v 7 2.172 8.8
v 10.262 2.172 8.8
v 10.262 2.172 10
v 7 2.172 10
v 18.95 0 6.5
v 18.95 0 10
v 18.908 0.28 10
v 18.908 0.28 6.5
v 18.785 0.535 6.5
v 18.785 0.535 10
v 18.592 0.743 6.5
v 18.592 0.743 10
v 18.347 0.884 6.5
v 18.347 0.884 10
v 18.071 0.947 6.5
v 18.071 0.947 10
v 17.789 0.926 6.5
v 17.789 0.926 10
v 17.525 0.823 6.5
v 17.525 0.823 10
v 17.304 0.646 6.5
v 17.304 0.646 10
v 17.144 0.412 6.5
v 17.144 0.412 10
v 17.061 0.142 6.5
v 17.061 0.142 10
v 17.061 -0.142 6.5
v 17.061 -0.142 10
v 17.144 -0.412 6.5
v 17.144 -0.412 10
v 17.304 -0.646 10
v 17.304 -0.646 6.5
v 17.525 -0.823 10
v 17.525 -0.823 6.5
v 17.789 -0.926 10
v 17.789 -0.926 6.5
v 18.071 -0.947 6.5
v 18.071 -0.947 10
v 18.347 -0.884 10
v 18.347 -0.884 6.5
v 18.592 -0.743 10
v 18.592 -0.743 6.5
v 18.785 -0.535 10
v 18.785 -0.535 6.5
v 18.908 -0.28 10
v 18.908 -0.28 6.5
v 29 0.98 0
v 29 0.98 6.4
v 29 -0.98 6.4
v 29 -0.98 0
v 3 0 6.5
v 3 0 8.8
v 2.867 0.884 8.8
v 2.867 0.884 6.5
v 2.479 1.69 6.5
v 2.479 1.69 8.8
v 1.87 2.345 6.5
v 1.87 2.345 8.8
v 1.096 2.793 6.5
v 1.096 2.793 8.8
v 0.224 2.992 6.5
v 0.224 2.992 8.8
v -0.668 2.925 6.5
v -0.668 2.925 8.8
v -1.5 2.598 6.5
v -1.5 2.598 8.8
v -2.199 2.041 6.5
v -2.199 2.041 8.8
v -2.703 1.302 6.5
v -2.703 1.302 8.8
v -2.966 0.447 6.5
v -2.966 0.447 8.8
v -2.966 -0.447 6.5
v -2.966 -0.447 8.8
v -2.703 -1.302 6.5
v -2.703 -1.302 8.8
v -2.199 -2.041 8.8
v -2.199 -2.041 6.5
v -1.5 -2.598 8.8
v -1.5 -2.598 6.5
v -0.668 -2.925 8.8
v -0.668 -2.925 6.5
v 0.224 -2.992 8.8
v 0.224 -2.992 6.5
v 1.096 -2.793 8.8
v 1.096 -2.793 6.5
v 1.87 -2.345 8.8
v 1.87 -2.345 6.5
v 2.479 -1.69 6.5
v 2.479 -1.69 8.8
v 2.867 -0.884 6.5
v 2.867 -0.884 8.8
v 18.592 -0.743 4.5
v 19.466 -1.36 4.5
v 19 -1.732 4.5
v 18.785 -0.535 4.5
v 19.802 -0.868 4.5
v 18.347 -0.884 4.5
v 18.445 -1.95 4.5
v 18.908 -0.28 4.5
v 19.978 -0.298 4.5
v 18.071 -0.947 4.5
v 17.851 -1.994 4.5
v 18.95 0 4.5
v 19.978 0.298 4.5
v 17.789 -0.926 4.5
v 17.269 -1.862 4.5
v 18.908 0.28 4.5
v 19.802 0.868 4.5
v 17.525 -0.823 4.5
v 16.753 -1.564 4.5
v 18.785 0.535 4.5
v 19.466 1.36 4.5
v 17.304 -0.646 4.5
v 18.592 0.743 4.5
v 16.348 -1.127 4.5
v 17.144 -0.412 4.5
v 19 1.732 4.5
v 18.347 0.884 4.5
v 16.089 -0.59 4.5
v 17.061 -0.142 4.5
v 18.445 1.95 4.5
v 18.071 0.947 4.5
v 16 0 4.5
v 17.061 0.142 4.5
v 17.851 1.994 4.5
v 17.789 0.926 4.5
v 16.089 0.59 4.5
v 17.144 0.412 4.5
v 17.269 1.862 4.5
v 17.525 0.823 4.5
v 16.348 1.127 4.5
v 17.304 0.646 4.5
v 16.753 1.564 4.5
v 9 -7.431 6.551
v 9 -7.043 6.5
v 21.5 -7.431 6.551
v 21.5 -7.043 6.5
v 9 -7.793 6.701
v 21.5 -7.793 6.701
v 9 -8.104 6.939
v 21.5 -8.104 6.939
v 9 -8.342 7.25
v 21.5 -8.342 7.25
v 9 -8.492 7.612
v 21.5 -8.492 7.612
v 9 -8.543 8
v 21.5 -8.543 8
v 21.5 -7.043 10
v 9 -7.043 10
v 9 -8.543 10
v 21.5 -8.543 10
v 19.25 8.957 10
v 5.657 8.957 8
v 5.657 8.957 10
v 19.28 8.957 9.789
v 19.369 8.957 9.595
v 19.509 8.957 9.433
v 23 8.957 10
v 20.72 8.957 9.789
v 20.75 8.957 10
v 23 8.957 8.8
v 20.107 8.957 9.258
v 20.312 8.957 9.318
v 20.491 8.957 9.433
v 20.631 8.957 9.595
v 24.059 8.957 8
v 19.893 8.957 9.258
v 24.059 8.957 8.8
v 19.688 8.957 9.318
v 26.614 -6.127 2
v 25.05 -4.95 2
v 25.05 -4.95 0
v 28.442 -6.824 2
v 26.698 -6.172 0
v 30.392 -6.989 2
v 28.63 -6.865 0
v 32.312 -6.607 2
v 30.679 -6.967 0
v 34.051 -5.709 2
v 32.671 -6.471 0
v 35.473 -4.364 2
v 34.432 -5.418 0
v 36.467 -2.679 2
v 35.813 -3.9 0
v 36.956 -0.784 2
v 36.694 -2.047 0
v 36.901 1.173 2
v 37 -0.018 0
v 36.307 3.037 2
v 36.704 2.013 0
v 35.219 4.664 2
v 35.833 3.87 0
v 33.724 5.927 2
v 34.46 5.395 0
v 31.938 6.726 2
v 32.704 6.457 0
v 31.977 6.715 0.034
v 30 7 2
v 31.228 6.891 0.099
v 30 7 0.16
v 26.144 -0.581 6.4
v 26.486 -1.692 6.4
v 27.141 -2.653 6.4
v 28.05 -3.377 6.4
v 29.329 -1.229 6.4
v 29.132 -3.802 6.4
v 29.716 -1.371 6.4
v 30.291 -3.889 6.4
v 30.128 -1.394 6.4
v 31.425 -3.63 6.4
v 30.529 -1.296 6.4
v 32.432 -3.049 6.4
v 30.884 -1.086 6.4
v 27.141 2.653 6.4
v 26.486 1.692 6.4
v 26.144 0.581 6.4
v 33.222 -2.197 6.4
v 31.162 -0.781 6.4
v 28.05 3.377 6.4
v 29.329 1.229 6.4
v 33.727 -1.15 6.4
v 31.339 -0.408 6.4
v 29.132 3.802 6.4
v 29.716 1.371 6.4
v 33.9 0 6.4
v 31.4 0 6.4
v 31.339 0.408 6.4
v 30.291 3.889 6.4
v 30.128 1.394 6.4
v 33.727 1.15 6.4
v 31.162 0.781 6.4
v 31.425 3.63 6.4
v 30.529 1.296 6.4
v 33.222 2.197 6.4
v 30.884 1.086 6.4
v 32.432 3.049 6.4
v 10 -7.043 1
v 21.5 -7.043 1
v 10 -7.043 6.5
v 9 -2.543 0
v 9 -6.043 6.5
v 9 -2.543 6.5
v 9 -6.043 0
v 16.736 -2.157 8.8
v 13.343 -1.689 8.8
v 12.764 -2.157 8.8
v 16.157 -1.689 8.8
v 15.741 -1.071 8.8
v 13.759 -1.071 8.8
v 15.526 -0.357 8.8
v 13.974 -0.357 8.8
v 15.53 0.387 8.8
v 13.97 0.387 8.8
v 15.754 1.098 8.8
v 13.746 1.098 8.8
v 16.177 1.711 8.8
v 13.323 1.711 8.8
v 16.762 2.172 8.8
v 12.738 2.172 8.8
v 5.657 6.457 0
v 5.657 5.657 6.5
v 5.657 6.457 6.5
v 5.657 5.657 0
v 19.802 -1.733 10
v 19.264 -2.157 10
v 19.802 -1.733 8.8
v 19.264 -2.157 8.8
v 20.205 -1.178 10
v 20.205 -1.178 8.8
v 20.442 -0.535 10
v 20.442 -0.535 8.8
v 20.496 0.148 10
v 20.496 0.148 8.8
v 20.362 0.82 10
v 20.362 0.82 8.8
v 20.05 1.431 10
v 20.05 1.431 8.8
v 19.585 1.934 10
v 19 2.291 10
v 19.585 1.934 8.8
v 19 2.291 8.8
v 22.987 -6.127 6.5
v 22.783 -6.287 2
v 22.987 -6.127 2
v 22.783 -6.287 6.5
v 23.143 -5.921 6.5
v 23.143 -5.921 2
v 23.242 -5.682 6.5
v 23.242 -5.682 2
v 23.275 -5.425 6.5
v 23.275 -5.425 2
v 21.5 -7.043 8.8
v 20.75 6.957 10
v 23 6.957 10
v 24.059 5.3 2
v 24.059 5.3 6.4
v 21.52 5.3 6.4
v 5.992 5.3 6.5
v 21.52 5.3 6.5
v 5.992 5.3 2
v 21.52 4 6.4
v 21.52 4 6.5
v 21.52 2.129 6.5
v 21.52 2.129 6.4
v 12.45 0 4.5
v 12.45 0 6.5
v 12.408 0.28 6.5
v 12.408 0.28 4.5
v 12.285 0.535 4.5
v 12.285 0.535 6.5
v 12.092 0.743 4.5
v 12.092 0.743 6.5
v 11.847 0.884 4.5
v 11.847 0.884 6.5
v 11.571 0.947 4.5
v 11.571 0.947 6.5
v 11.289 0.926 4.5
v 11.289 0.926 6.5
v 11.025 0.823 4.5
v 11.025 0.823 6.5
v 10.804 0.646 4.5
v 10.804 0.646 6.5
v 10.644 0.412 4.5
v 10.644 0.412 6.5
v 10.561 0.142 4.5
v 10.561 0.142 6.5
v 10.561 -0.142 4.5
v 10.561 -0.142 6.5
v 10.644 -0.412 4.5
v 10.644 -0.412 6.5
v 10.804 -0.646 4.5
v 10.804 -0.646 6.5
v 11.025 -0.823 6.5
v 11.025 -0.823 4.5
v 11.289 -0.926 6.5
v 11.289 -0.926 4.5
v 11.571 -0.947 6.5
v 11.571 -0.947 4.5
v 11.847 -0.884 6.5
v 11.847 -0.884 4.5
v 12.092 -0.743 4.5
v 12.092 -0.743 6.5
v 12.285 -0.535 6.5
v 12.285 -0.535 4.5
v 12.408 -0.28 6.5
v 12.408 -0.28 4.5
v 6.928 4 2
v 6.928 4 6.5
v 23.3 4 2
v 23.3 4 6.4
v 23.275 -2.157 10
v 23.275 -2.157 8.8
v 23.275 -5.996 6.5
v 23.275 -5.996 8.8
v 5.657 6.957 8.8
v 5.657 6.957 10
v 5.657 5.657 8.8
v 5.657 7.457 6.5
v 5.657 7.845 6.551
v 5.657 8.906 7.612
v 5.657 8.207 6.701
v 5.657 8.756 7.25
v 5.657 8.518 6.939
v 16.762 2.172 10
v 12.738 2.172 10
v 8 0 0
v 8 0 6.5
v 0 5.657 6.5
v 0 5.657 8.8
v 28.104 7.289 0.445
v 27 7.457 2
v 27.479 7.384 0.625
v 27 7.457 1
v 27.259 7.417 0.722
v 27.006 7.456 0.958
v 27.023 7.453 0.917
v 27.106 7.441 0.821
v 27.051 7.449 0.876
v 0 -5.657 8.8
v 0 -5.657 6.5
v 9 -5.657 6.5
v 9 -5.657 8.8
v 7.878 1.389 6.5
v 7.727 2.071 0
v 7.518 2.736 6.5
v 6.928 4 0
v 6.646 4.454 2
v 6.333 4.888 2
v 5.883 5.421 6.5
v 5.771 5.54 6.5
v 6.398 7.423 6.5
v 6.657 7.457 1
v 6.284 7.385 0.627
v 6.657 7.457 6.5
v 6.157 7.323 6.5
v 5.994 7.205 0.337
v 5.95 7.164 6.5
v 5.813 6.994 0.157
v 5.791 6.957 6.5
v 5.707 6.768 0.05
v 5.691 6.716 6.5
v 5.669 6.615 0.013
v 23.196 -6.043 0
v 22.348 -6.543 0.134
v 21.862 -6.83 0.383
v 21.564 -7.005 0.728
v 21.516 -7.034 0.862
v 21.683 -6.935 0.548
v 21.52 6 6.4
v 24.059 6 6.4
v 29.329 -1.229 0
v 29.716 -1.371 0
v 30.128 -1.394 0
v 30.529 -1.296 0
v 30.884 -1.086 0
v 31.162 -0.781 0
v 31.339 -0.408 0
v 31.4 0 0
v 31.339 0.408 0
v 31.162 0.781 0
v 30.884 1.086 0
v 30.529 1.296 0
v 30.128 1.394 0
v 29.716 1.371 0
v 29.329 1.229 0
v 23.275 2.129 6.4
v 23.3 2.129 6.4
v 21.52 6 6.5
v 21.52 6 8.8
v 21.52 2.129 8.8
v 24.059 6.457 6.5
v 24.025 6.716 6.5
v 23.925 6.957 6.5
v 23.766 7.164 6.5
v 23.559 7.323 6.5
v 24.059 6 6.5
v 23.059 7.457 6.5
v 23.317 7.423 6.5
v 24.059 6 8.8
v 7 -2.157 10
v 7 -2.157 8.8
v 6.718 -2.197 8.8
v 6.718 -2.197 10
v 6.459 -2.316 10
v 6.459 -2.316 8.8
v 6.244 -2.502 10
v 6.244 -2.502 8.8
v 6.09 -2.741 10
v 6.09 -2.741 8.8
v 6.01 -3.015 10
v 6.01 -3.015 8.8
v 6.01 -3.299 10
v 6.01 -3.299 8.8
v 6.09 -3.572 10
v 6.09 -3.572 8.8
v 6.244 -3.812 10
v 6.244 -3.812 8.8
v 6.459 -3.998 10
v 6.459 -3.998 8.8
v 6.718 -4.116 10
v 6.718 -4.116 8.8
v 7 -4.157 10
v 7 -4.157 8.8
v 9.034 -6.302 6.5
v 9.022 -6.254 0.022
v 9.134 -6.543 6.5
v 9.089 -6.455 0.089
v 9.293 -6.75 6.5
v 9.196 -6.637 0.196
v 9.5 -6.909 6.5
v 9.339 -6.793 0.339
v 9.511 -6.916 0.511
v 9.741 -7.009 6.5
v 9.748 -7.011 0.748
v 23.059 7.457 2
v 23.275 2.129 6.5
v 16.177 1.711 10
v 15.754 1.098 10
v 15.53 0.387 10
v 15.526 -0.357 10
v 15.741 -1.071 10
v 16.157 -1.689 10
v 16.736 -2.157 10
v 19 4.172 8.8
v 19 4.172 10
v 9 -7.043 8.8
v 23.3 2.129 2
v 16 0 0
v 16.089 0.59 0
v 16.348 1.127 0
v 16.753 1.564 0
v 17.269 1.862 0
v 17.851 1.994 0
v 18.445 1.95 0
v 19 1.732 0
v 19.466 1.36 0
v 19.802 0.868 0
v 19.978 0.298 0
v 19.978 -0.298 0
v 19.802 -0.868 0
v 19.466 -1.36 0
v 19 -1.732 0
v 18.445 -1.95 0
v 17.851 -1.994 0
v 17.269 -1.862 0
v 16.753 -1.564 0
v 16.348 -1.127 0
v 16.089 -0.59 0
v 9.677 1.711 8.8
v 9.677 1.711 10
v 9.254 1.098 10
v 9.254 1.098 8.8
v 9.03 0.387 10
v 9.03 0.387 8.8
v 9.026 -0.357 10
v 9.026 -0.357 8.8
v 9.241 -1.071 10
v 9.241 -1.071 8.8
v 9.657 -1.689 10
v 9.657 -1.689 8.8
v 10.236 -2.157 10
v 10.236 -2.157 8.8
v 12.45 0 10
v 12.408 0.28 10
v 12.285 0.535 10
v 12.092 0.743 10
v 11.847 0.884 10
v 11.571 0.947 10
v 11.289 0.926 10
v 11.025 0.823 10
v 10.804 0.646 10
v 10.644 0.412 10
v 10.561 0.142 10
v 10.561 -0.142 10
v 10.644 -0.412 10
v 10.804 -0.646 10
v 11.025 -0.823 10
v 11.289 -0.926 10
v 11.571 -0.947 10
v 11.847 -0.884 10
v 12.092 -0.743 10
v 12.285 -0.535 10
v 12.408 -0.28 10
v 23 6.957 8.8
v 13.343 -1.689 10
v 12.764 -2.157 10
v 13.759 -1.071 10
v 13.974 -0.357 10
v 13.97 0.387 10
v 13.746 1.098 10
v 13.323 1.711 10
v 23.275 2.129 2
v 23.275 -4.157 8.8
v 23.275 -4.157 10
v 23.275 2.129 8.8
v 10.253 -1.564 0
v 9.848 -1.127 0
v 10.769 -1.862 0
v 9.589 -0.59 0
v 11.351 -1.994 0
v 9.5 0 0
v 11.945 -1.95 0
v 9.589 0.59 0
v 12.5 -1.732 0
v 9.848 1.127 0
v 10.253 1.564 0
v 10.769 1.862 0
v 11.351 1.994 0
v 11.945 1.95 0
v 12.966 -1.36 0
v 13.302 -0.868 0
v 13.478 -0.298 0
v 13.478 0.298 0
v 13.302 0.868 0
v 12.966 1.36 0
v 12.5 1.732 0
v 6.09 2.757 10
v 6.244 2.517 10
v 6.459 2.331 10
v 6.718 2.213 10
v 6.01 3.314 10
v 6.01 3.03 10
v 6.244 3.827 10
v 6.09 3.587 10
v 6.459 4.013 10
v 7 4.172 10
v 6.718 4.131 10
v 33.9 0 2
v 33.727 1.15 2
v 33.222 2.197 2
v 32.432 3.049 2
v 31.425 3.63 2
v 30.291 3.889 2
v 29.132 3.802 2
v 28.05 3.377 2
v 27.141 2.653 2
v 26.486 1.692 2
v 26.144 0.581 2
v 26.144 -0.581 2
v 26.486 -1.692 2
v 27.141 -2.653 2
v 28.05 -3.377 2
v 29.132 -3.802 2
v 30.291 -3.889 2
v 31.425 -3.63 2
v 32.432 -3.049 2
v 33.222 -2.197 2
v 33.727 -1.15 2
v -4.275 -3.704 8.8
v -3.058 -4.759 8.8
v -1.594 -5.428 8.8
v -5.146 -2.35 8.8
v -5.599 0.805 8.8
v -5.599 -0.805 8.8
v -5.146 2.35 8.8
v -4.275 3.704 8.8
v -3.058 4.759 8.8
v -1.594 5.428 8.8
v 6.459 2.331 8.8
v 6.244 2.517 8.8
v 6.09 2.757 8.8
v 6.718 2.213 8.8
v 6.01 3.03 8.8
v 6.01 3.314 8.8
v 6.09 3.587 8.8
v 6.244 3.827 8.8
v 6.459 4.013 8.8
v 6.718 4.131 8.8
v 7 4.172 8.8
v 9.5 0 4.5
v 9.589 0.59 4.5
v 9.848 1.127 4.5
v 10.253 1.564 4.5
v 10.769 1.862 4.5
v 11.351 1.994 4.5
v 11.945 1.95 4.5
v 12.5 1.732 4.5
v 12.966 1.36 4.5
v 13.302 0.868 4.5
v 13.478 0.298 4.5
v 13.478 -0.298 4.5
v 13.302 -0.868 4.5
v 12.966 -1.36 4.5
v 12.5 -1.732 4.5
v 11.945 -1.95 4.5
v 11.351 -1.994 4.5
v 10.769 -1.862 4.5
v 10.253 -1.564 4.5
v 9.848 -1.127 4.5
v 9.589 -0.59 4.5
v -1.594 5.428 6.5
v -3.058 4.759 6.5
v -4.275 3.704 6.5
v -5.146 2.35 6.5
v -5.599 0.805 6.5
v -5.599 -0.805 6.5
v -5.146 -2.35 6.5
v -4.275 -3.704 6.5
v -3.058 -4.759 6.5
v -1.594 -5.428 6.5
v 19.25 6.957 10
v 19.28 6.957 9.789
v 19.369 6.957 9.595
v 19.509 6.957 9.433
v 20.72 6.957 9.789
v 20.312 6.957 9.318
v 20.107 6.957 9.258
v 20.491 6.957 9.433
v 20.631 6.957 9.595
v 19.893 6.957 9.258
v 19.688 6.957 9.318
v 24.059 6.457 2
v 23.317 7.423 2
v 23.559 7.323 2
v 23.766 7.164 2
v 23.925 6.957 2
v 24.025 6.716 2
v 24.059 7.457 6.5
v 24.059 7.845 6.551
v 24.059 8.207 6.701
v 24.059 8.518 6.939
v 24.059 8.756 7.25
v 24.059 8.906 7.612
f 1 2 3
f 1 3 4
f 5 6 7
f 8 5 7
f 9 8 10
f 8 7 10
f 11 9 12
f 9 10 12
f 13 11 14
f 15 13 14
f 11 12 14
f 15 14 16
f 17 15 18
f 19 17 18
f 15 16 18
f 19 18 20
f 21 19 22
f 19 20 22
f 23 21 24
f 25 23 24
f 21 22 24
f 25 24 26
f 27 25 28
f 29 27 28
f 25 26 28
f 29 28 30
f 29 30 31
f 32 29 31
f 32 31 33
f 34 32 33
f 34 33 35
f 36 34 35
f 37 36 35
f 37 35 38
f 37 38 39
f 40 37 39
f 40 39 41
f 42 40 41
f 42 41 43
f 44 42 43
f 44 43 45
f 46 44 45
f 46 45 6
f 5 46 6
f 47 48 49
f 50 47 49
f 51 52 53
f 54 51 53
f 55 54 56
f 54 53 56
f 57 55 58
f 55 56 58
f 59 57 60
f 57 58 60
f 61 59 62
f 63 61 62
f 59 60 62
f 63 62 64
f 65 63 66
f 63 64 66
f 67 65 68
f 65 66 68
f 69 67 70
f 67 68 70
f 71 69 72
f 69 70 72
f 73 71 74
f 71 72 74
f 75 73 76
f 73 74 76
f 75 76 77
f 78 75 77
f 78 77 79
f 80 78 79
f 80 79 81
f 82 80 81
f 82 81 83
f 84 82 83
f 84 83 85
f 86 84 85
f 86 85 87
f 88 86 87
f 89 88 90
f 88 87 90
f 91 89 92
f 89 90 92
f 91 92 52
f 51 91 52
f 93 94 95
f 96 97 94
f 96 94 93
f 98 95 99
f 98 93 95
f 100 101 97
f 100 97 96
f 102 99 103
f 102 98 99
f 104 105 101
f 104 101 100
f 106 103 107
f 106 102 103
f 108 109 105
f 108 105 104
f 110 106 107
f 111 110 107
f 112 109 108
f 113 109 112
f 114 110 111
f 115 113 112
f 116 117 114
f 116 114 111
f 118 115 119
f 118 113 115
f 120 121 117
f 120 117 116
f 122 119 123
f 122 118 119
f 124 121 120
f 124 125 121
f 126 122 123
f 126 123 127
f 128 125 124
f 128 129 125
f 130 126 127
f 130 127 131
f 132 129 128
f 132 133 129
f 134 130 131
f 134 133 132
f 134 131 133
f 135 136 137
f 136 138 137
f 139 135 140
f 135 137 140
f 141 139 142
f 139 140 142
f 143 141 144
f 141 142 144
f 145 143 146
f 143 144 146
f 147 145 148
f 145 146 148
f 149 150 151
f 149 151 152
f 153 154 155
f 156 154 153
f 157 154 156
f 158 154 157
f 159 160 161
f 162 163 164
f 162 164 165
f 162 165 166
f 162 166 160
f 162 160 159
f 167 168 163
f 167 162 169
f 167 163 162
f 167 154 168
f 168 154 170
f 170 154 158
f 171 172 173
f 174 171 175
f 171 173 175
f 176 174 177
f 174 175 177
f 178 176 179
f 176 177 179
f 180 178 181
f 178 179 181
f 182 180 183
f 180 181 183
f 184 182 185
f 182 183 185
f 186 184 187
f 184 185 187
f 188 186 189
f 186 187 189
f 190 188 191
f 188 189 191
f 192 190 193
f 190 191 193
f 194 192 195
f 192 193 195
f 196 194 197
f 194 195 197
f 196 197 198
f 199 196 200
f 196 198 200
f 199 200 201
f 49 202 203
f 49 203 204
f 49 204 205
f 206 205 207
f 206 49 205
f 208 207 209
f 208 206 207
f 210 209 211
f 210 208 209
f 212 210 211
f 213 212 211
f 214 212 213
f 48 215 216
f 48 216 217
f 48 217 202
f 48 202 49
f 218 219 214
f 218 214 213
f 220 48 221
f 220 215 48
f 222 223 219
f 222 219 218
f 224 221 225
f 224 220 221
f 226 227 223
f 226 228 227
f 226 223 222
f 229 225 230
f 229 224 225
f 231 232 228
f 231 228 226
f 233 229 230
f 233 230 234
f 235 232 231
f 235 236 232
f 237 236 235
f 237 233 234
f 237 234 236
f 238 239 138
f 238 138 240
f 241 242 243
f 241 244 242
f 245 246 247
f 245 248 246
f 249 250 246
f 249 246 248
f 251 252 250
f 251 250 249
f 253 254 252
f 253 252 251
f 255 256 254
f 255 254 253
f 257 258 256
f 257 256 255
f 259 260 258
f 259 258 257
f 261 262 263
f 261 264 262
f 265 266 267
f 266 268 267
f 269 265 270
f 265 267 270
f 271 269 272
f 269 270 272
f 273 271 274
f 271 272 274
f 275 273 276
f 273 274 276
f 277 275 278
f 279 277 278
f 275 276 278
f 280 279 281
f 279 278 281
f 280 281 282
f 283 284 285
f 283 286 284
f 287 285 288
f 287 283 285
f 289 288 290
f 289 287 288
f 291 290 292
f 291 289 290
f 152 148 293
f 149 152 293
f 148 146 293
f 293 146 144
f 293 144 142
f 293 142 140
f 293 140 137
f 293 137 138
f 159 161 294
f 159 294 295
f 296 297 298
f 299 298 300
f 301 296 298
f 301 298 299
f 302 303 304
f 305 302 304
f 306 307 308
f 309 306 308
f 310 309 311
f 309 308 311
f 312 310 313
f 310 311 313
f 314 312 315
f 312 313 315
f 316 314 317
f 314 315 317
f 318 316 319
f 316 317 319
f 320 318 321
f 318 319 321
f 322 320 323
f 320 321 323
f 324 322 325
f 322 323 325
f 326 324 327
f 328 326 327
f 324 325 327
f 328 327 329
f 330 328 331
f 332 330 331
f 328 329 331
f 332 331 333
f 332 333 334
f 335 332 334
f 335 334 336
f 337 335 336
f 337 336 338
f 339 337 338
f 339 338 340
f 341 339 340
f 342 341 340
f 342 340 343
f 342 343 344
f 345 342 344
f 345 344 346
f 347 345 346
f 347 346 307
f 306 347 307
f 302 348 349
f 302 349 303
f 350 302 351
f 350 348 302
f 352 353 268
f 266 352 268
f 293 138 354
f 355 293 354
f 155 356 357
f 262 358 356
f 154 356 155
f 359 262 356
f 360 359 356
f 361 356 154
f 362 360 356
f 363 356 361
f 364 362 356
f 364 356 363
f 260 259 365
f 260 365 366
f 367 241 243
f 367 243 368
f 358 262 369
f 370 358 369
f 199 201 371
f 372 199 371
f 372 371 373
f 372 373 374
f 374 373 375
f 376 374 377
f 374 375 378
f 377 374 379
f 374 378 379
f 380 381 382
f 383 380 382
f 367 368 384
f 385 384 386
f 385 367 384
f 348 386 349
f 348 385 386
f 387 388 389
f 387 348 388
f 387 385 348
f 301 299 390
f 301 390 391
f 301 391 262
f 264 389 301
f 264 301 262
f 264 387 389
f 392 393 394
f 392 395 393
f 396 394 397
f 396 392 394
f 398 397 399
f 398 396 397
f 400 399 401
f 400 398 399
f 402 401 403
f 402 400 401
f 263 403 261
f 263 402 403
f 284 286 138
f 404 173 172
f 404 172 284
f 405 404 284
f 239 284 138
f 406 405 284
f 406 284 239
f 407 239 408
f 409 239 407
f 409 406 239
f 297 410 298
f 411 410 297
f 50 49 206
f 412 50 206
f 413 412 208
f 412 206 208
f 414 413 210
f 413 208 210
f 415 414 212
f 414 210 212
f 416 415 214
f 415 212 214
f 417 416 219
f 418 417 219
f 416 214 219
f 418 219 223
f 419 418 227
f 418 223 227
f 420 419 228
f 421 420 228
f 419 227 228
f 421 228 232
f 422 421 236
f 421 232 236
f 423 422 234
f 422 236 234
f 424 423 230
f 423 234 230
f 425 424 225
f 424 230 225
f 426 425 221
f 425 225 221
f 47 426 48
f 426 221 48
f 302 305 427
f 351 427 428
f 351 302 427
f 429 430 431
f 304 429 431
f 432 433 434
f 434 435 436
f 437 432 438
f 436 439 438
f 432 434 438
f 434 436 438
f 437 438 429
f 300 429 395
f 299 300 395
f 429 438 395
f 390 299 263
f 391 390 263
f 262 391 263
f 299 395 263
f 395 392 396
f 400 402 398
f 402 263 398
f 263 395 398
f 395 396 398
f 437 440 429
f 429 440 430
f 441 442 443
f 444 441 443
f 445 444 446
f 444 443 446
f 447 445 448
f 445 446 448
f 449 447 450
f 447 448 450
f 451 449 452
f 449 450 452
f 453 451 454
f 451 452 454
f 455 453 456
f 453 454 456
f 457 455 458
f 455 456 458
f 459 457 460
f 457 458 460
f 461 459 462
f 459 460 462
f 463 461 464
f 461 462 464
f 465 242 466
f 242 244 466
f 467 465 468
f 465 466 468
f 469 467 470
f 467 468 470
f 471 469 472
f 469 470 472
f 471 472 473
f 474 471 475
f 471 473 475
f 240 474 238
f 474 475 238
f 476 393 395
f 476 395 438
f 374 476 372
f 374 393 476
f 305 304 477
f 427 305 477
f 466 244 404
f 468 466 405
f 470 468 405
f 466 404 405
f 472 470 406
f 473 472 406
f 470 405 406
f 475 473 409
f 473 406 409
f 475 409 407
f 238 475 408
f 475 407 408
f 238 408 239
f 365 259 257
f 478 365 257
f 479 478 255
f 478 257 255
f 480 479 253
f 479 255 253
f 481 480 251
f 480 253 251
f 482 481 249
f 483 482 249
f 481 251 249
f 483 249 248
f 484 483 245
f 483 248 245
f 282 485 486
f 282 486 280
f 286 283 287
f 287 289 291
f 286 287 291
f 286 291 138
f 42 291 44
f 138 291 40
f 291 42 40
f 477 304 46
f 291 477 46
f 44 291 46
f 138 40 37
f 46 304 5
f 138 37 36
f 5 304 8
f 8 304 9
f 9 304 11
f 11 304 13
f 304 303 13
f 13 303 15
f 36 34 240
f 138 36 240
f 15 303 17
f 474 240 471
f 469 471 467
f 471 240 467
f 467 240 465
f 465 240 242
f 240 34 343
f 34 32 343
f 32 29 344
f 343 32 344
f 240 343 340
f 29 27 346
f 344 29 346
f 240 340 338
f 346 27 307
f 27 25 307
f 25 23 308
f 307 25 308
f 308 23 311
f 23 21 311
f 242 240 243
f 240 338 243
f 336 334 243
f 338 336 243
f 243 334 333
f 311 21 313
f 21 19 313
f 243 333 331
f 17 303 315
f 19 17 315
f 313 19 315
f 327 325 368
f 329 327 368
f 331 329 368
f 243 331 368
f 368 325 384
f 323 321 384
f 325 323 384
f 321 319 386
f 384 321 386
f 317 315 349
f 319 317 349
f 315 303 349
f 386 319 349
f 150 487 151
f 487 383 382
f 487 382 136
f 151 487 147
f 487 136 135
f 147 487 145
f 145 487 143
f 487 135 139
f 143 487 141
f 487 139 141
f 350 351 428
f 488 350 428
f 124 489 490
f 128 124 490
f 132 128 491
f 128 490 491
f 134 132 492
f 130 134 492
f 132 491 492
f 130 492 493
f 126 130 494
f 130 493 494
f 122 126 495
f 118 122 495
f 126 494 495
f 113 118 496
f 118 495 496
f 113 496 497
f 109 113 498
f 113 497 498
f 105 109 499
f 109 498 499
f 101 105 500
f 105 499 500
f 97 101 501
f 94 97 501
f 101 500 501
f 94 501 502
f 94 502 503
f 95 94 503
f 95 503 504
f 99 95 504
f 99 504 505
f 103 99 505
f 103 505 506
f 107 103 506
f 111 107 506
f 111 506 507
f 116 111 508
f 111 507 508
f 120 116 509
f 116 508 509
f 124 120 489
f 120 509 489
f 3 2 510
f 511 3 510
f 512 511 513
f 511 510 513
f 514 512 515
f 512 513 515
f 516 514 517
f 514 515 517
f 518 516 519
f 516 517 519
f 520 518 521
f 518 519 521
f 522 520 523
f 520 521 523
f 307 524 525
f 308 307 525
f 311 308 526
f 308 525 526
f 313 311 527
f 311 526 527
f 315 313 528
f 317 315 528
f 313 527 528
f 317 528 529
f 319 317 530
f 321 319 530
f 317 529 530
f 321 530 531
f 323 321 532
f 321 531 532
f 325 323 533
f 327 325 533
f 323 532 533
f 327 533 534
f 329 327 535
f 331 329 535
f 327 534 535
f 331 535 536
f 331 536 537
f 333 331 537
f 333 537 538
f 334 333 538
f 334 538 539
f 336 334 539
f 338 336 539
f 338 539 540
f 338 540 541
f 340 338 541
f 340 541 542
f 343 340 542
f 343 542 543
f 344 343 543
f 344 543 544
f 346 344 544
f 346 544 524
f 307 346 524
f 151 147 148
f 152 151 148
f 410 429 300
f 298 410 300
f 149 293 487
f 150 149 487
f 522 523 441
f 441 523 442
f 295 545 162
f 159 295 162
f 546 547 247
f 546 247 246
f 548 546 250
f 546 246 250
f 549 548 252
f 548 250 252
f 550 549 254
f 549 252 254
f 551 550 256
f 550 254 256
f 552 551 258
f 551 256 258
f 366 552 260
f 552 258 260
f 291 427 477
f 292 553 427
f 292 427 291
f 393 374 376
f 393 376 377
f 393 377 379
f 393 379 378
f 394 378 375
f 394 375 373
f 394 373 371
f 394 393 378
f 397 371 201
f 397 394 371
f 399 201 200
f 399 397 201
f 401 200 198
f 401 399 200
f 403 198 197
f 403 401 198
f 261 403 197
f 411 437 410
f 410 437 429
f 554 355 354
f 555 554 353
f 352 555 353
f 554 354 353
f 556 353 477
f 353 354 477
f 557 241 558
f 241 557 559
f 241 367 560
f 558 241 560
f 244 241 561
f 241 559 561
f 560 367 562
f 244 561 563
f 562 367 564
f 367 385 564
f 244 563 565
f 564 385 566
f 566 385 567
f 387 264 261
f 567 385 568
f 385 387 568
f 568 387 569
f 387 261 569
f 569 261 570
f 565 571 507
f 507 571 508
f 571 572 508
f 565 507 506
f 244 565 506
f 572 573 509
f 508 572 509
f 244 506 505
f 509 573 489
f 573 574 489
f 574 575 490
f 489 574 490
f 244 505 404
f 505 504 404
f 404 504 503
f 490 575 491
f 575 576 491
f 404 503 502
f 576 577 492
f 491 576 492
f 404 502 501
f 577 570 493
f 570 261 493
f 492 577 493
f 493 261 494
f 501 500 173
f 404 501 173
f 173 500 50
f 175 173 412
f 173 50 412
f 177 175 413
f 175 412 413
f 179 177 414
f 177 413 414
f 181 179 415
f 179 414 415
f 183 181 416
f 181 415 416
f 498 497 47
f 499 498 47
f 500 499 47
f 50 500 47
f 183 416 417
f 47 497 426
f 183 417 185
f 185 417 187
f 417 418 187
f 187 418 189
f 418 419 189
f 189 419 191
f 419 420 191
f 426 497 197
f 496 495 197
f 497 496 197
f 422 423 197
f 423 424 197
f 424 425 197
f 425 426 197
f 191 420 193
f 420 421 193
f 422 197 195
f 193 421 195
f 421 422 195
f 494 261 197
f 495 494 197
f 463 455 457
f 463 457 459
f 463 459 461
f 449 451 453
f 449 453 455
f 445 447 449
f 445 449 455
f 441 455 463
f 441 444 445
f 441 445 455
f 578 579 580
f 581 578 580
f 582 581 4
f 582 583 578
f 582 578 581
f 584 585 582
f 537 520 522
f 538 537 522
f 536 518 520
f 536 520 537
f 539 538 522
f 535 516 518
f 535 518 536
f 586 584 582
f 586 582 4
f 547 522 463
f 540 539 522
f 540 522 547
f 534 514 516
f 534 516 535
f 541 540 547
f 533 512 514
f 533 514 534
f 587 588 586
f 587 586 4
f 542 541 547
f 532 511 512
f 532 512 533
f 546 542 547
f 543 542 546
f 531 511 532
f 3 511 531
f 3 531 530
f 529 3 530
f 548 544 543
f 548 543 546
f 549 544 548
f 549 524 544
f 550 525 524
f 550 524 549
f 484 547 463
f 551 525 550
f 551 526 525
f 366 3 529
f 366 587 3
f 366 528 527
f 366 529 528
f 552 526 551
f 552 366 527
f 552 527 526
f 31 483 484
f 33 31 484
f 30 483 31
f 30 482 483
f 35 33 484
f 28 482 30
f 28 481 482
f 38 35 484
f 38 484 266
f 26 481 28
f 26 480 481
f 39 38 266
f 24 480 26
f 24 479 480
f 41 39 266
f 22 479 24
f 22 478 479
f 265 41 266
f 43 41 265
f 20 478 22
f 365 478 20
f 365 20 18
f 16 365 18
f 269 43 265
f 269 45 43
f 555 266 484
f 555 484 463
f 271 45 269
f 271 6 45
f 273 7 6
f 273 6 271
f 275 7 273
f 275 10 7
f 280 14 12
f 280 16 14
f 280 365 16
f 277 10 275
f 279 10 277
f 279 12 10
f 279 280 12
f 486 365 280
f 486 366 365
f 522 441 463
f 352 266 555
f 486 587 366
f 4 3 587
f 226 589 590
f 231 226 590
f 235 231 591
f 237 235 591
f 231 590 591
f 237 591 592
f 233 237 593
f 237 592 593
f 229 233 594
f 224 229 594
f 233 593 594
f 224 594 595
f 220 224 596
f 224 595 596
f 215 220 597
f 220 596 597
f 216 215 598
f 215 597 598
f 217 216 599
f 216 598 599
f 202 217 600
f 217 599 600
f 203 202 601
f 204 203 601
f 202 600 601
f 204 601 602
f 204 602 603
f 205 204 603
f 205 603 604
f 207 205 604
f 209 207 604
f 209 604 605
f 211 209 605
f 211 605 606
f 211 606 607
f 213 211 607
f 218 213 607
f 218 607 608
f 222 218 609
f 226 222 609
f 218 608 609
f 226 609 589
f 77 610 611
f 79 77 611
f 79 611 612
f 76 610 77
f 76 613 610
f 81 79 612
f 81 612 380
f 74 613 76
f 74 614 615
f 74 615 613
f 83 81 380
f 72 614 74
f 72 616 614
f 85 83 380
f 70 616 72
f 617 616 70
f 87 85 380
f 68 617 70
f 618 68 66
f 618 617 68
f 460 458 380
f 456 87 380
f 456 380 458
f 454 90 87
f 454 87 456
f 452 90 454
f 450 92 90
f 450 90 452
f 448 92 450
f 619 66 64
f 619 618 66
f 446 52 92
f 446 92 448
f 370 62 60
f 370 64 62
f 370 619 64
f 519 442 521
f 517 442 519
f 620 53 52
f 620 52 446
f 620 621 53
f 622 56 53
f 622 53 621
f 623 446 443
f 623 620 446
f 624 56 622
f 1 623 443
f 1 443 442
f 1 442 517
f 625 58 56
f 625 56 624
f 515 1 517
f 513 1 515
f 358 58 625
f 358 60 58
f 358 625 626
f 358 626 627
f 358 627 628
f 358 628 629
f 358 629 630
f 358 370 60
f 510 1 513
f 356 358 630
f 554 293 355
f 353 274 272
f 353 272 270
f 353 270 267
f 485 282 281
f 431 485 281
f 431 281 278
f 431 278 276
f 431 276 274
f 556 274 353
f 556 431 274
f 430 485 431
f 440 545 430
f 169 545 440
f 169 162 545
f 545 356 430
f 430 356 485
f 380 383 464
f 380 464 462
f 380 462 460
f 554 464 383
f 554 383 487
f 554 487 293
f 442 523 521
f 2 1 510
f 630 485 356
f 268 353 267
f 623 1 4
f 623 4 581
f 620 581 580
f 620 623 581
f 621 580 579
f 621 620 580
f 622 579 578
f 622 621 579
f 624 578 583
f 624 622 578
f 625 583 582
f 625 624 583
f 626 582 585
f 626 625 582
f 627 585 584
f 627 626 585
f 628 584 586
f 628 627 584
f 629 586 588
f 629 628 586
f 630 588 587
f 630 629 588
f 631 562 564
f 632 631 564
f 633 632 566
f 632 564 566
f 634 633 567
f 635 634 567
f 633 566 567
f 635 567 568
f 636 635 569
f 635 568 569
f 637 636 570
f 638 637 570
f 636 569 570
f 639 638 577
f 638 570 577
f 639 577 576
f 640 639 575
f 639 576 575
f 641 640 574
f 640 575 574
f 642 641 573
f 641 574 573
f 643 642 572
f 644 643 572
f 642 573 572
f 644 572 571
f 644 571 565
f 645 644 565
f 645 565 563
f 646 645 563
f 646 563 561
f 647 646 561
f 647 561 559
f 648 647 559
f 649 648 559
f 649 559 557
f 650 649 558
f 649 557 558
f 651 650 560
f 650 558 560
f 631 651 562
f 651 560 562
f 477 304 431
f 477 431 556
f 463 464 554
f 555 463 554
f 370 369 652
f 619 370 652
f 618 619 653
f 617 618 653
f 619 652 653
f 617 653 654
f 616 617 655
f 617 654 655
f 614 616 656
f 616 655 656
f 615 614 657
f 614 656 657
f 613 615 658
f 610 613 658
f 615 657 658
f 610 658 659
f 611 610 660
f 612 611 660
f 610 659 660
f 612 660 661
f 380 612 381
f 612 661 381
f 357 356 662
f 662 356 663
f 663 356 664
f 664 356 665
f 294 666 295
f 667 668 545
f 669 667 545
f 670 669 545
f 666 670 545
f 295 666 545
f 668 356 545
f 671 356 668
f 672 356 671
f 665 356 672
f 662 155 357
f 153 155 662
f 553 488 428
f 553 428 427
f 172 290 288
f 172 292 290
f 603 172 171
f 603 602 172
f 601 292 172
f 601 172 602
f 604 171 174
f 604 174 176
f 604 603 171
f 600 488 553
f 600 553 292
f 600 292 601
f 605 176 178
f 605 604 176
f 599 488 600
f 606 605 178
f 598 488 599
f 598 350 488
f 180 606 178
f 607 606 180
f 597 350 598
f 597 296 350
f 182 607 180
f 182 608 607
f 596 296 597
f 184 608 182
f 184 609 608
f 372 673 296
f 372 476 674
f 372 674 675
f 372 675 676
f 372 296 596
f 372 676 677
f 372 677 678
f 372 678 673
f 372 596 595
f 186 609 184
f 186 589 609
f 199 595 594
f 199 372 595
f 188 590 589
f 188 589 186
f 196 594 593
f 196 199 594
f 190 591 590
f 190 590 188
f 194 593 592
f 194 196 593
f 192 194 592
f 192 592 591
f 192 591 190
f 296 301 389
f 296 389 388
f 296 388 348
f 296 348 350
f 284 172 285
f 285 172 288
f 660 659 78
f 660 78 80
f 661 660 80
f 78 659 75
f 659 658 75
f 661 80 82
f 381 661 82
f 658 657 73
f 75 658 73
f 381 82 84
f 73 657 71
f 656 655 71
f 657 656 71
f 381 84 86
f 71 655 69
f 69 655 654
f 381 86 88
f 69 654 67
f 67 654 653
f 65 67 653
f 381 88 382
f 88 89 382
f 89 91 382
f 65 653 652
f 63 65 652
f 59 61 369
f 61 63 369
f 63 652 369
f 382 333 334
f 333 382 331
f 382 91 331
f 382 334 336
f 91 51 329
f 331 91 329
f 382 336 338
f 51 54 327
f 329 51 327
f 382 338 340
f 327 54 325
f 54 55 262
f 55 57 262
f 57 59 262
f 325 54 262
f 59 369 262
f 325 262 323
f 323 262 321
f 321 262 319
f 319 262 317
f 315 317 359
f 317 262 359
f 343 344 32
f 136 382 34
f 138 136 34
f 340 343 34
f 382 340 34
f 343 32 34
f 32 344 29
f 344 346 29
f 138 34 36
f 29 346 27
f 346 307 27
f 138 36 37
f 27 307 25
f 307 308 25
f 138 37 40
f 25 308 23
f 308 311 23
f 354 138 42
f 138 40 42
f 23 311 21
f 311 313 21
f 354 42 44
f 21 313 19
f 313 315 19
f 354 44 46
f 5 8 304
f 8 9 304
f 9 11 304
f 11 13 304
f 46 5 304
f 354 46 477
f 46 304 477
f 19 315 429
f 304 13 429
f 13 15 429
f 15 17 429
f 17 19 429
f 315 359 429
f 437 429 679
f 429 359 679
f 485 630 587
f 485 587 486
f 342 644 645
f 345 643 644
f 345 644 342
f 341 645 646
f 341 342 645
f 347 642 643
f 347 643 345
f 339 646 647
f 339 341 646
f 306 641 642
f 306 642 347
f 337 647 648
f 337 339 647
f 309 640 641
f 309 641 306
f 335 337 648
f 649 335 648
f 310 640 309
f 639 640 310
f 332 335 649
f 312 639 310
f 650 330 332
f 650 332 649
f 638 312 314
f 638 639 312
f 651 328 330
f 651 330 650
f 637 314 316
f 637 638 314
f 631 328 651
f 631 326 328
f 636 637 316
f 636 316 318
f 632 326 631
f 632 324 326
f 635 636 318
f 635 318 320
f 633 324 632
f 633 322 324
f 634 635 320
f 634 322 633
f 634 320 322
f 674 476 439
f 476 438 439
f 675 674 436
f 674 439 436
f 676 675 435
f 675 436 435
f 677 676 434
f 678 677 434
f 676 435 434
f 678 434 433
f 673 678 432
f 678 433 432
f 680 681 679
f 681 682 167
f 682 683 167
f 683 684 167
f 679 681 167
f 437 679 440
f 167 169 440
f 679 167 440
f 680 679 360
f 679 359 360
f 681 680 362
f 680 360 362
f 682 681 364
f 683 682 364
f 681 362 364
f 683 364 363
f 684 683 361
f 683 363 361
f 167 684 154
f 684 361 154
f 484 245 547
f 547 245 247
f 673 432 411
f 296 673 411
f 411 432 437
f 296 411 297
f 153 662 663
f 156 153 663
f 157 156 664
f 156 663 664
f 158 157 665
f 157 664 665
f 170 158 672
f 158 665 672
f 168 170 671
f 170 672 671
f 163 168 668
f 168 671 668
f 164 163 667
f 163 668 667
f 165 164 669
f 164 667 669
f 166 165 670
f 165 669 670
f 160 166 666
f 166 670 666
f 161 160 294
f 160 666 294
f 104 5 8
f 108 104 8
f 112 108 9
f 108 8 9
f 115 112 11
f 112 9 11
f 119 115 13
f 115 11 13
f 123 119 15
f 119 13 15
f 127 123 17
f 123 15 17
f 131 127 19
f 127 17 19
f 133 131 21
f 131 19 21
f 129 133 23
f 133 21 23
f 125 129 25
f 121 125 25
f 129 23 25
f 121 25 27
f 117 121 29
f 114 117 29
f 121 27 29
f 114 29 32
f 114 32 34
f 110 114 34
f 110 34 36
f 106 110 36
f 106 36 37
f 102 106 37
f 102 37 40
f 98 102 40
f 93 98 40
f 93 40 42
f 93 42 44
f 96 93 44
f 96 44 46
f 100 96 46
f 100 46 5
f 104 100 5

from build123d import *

# Parameters (mm, degrees)
BOSS_EXTRUDE1_DEPTH  = 2
BOSS_EXTRUDE6_DEPTH  = 4.5
CUT_EXTRUDE6_DEPTH   = 4.5
BOSS_EXTRUDE14_DEPTH = 2.3
SKETCH32_R           = 3
CUT_EXTRUDE7_DEPTH   = 2.3
SKETCH33_W           = 17.343145750507624
SKETCH33_H           = 2
BOSS_EXTRUDE15_DEPTH = 1.2
CUT_EXTRUDE8_DEPTH   = 2.4
CUT_EXTRUDE9_DEPTH   = 4.3999999999999995
SKETCH37_R           = 3.899999999999994
BOSS_EXTRUDE16_DEPTH = 4.4
CUT_EXTRUDE10_DEPTH  = 39.60291748102272
SKETCH43_R           = 2.5000000000000004
SKETCH43_R_2         = 2.4999999999999982
BOSS_EXTRUDE17_DEPTH = 1.2
SKETCH44_R           = 0.9499999999999992
SKETCH44_R_2         = 0.9500000000000008
CUT_EXTRUDE11_DEPTH  = 40.360198653546576
SKETCH45_R           = 1.9999999999999996
SKETCH45_R_2         = 2.000000000000003
CUT_EXTRUDE12_DEPTH  = 4.5
SKETCH49_R           = 0.7500000000000021
CUT_EXTRUDE13_DEPTH  = 3
CUT_EXTRUDE14_DEPTH  = 6.8
FILLET1_R            = 1.5
FILLET3_R            = 1


with BuildPart() as part:
    # Sketch3 → Boss-Extrude1 (new body)
    with BuildSketch(Plane.XY):
        with BuildLine():
            Line((8.000000000000002, 0), (8.999999999999993, -2.5431457505076343))
            Line((8.999999999999993, -2.5431457505076343), (8.999999999999993, -7.04314575050762))
            Line((8.999999999999993, -7.04314575050762), (21.50000000000003, -7.043145750507617))
            Line((21.50000000000003, -7.043145750507617), (25.05025253169419, -4.949747468305846))
            ThreePointArc((25.05025253169419, -4.949747468305846), (36.46715672757901, -2.678784026555599), (30, 7.000000000000014))
            Line((30, 7.000000000000014), (26.999999999999996, 7.456854249492377))
            Line((26.999999999999996, 7.456854249492377), (5.656854249492369, 7.456854249492377))
            Line((5.656854249492369, 7.456854249492377), (5.656854249492376, 5.656854249492382))
            ThreePointArc((5.656854249492376, 5.656854249492382), (7.391036260090296, 3.061467458920721), (8.000000000000002, 0))
        make_face()
    extrude(amount=BOSS_EXTRUDE1_DEPTH)

    # Sketch22 → Boss-Extrude6 (add)
    with BuildSketch(Plane.XY.offset(2)):
        with BuildLine():
            Line((5.656854249492376, 7.456854249492377), (21.50000000000004, 7.456854249492377))
            Line((21.50000000000004, 7.456854249492377), (26.999999999999996, 7.456854249492377))
            Line((26.999999999999996, 7.456854249492377), (26.999999999999996, 2.1288604946885763))
            Line((26.999999999999996, 2.1288604946885763), (23.27512626584711, 2.128860494688576))
            Line((23.27512626584711, 2.128860494688576), (23.27512626584711, -5.996446609406731))
            Line((23.27512626584711, -5.996446609406731), (21.50000000000003, -7.043145750507617))
            Line((21.50000000000003, -7.043145750507617), (8.999999999999993, -7.04314575050762))
            Line((8.999999999999993, -7.04314575050762), (8.999999999999993, -2.5431457505076343))
            Line((8.999999999999993, -2.5431457505076343), (7.999999999999998, 0))
            ThreePointArc((7.999999999999998, 0), (7.391036260090291, 3.061467458920719), (5.656854249492376, 5.656854249492382))
            Line((5.656854249492376, 5.656854249492382), (5.656854249492376, 7.456854249492377))
        make_face()
    extrude(amount=BOSS_EXTRUDE6_DEPTH)

    # Sketch26 → Cut-Extrude6 (cut)
    with BuildSketch(Plane.XY.offset(2)):
        Polygon((18.098080447707712, 5.299999999999999), (2.5300524575164793, 5.299999999999999), (2.5300524575164793, 4), (18.098080447707712, 4), (26.999999999999996, 4), (26.999999999999996, 5.299999999999999), align=None)
    extrude(amount=CUT_EXTRUDE6_DEPTH, mode=Mode.SUBTRACT)


with BuildPart() as body_2:
    # Sketch31 → Boss-Extrude14 (new body)
    with BuildSketch(Plane.XY.offset(6.5)):
        with BuildLine():
            Line((2.4326880657739025, 5.656854249492382), (0, 5.656854249492382))
            ThreePointArc((0, 5.656854249492382), (-5.656854249492382, 6.9e-16), (0, -5.656854249492382))
            Line((0, -5.656854249492382), (9.000000000000004, -5.656854249492382))
            Line((9.000000000000004, -5.656854249492382), (8.999999999999993, -7.04314575050762))
            Line((8.999999999999993, -7.04314575050762), (8.999999999999993, -8.54314575050762))
            Line((8.999999999999993, -8.54314575050762), (21.50000000000003, -8.54314575050762))
            Line((21.50000000000003, -8.54314575050762), (21.50000000000003, -7.043145750507617))
            Line((21.50000000000003, -7.043145750507617), (23.27512626584711, -5.996446609406731))
            Line((23.27512626584711, -5.996446609406731), (23.27512626584711, 2.128860494688576))
            Line((23.27512626584711, 2.128860494688576), (26.999999999999996, 2.1288604946885763))
            Line((26.999999999999996, 2.1288604946885763), (26.999999999999996, 7.456854249492377))
            Line((26.999999999999996, 7.456854249492377), (26.999999999999996, 8.956854249492377))
            Line((26.999999999999996, 8.956854249492377), (5.656854249492376, 8.956854249492377))
            Line((5.656854249492376, 8.956854249492377), (5.656854249492376, 7.456854249492377))
            Line((5.656854249492376, 7.456854249492377), (5.656854249492376, 5.656854249492382))
            Line((5.656854249492376, 5.656854249492382), (2.4326880657739025, 5.656854249492382))
        make_face()
    extrude(amount=BOSS_EXTRUDE14_DEPTH)

    # Sketch32 → Cut-Extrude7 (cut)
    with BuildSketch(Plane.XY.offset(8.799999999999999)):
        Circle(SKETCH32_R)
    extrude(amount=-CUT_EXTRUDE7_DEPTH, mode=Mode.SUBTRACT)

    # Sketch33 → Boss-Extrude15 (add)
    with BuildSketch(Plane.XY.offset(8.799999999999999)):
        with Locations((14.328427124746185, 7.956854249492377)):
            Rectangle(SKETCH33_W, SKETCH33_H)
        Polygon((9.000000000000004, -7.043145750507619), (9.000000000000004, -8.54314575050762), (21.50000000000003, -8.54314575050762), (21.50000000000003, -7.043145750507617), align=None)
        with BuildLine():
            Line((7.000000000000003, -4.156854249492383), (23.275126265847117, -4.156854249492383))
            Line((23.275126265847117, -4.156854249492383), (23.275126265847113, -2.1568542494923815))
            Line((23.275126265847113, -2.1568542494923815), (7.000000000000003, -2.1568542494923832))
            ThreePointArc((7.000000000000003, -2.1568542494923832), (6.000000000000003, -3.1568542494923832), (7.000000000000003, -4.156854249492383))
        make_face()
        with BuildLine():
            Line((18.999999999999996, 2.172006245196199), (7.000000000000003, 2.172006245196201))
            ThreePointArc((7.000000000000003, 2.172006245196201), (6.0000000000000036, 3.1720062451962), (7.000000000000003, 4.172006245196199))
            Line((7.000000000000003, 4.172006245196199), (18.999999999999996, 4.172006245196199))
            Line((18.999999999999996, 4.172006245196199), (18.999999999999996, 2.172006245196199))
        make_face()
    extrude(amount=BOSS_EXTRUDE15_DEPTH)


with BuildPart() as cut_extrude8_tool:
    # Sketch35 → Cut-Extrude8 (new body)
    with BuildSketch(Plane.XY.offset(8.799999999999999)):
        Polygon((26.999999999999996, 2.1288604946885763), (26.999999999999996, 6.000000000000002), (21.520354003499165, 6.000000000000002), (21.520354003499165, 2.1288604946885754), align=None)
    extrude(amount=-CUT_EXTRUDE8_DEPTH)


with BuildPart() as part_1:
    add(part.part)

    # Cut-Extrude8: cut by cut_extrude8_tool
    add(cut_extrude8_tool.part, mode=Mode.SUBTRACT)

    # Sketch36 → Cut-Extrude9 (cut)
    with BuildSketch(Plane.XY.offset(6.3999999999999995)):
        Polygon((26.999999999999996, 2.1288604946885763), (26.999999999999996, 4), (23.30000000000004, 3.999999999999999), (23.30000000000003, 2.1288604946885754), align=None)
    extrude(amount=-CUT_EXTRUDE9_DEPTH, mode=Mode.SUBTRACT)

    # Sketch37 → Boss-Extrude16 (add)
    with BuildSketch(Plane.XY.offset(2)):
        with Locations((29.999999999999996, 1.388e-14)):
            Circle(SKETCH37_R)
    extrude(amount=BOSS_EXTRUDE16_DEPTH)

    # Sketch39 → Cut-Extrude10 (cut, through all)
    with BuildSketch(Plane.XY.offset(6.4)):
        with BuildLine():
            Line((28.999999999999993, 0.9797958971132569), (28.999999999999993, -0.9797958971132569))
            ThreePointArc((28.999999999999993, -0.9797958971132569), (31.4, 2.383e-14), (28.999999999999993, 0.9797958971132569))
        make_face()
    extrude(amount=-CUT_EXTRUDE10_DEPTH, mode=Mode.SUBTRACT)


with BuildPart() as body_2_1:
    add(body_2.part)

    # Cut-Extrude8: cut by cut_extrude8_tool
    add(cut_extrude8_tool.part, mode=Mode.SUBTRACT)

    # Sketch43 → Boss-Extrude17 (add)
    with BuildSketch(Plane.XY.offset(8.799999999999999)):
        with Locations((11.500000000000004, 0)):
            Circle(SKETCH43_R)
        with Locations((18.000000000000004, 0)):
            Circle(SKETCH43_R_2)
    extrude(amount=BOSS_EXTRUDE17_DEPTH)


with BuildPart() as cut_extrude11_tool:
    # Sketch44 → Cut-Extrude11 (new, through all)
    with BuildSketch(Plane.XY.offset(9.999999999999998)):
        with Locations((11.500000000000004, 0)):
            Circle(SKETCH44_R)
        with Locations((18.000000000000004, 0)):
            Circle(SKETCH44_R_2)
    extrude(amount=-CUT_EXTRUDE11_DEPTH)


with BuildPart() as part_2:
    add(part_1.part)

    # Cut-Extrude11: cut by cut_extrude11_tool
    add(cut_extrude11_tool.part, mode=Mode.SUBTRACT)

    # Sketch45 → Cut-Extrude12 (cut)
    with BuildSketch(Plane(origin=(0, 0, 0), x_dir=(-1, 0, 0), z_dir=(0, 0, -1))):
        with Locations((-11.500000000000004, 0)):
            Circle(SKETCH45_R)
        with Locations((-18.000000000000004, 0)):
            Circle(SKETCH45_R_2)
    extrude(amount=-CUT_EXTRUDE12_DEPTH, mode=Mode.SUBTRACT)


with BuildPart() as body_2_2:
    add(body_2_1.part)

    # Cut-Extrude11: cut by cut_extrude11_tool
    add(cut_extrude11_tool.part, mode=Mode.SUBTRACT)

    # Sketch49 → Cut-Extrude13 (cut)
    with BuildSketch(Plane.XZ.offset(-6.956854249492377)):
        with Locations((19.999999999999996, 9.999999999999998)):
            Circle(SKETCH49_R)
    extrude(amount=-CUT_EXTRUDE13_DEPTH, mode=Mode.SUBTRACT)


with BuildPart() as cut_extrude14_tool:
    # Sketch51 → Cut-Extrude14 (new body)
    with BuildSketch(Plane.XY.offset(8.799999999999999)):
        Polygon((27, 8.956854249492377), (24.058650564533934, 8.956854249492377), (24.058650564533938, 4.991269007681976), (26.999999999999996, 4.991269007681976), align=None)
    extrude(amount=-CUT_EXTRUDE14_DEPTH)


with BuildPart() as part_3:
    add(part_2.part)

    # Cut-Extrude14: cut by cut_extrude14_tool
    add(cut_extrude14_tool.part, mode=Mode.SUBTRACT)

    # Fillet3
    fillet3_edges = [part_3.edges().sort_by_distance(p)[0] for p in [
        (23.27512626584711, -5.996446609406731, 4.25),
        (24.058650564533934, 7.456854249492377, 4.25),
        (8.999999999999993, -7.04314575050762, 3.25),
        (5.656854249492373, 7.456854249492377, 3.25),
        (15.25000000000001, -7.043145750507618, 0),
        (16.328427124746185, 7.456854249492377, 0),
    ]]
    fillet(fillet3_edges, radius=FILLET3_R)


with BuildPart() as body_2_3:
    add(body_2_2.part)

    # Cut-Extrude14: cut by cut_extrude14_tool
    add(cut_extrude14_tool.part, mode=Mode.SUBTRACT)

    # Fillet1
    fillet1_edges = [body_2_3.edges().sort_by_distance(p)[0] for p in [
        (14.857752407013155, 8.956854249492377, 6.5),
        (15.25000000000001, -8.54314575050762, 6.5),
    ]]
    fillet(fillet1_edges, radius=FILLET1_R)


solid = Compound([part_3.part, body_2_3.part])
